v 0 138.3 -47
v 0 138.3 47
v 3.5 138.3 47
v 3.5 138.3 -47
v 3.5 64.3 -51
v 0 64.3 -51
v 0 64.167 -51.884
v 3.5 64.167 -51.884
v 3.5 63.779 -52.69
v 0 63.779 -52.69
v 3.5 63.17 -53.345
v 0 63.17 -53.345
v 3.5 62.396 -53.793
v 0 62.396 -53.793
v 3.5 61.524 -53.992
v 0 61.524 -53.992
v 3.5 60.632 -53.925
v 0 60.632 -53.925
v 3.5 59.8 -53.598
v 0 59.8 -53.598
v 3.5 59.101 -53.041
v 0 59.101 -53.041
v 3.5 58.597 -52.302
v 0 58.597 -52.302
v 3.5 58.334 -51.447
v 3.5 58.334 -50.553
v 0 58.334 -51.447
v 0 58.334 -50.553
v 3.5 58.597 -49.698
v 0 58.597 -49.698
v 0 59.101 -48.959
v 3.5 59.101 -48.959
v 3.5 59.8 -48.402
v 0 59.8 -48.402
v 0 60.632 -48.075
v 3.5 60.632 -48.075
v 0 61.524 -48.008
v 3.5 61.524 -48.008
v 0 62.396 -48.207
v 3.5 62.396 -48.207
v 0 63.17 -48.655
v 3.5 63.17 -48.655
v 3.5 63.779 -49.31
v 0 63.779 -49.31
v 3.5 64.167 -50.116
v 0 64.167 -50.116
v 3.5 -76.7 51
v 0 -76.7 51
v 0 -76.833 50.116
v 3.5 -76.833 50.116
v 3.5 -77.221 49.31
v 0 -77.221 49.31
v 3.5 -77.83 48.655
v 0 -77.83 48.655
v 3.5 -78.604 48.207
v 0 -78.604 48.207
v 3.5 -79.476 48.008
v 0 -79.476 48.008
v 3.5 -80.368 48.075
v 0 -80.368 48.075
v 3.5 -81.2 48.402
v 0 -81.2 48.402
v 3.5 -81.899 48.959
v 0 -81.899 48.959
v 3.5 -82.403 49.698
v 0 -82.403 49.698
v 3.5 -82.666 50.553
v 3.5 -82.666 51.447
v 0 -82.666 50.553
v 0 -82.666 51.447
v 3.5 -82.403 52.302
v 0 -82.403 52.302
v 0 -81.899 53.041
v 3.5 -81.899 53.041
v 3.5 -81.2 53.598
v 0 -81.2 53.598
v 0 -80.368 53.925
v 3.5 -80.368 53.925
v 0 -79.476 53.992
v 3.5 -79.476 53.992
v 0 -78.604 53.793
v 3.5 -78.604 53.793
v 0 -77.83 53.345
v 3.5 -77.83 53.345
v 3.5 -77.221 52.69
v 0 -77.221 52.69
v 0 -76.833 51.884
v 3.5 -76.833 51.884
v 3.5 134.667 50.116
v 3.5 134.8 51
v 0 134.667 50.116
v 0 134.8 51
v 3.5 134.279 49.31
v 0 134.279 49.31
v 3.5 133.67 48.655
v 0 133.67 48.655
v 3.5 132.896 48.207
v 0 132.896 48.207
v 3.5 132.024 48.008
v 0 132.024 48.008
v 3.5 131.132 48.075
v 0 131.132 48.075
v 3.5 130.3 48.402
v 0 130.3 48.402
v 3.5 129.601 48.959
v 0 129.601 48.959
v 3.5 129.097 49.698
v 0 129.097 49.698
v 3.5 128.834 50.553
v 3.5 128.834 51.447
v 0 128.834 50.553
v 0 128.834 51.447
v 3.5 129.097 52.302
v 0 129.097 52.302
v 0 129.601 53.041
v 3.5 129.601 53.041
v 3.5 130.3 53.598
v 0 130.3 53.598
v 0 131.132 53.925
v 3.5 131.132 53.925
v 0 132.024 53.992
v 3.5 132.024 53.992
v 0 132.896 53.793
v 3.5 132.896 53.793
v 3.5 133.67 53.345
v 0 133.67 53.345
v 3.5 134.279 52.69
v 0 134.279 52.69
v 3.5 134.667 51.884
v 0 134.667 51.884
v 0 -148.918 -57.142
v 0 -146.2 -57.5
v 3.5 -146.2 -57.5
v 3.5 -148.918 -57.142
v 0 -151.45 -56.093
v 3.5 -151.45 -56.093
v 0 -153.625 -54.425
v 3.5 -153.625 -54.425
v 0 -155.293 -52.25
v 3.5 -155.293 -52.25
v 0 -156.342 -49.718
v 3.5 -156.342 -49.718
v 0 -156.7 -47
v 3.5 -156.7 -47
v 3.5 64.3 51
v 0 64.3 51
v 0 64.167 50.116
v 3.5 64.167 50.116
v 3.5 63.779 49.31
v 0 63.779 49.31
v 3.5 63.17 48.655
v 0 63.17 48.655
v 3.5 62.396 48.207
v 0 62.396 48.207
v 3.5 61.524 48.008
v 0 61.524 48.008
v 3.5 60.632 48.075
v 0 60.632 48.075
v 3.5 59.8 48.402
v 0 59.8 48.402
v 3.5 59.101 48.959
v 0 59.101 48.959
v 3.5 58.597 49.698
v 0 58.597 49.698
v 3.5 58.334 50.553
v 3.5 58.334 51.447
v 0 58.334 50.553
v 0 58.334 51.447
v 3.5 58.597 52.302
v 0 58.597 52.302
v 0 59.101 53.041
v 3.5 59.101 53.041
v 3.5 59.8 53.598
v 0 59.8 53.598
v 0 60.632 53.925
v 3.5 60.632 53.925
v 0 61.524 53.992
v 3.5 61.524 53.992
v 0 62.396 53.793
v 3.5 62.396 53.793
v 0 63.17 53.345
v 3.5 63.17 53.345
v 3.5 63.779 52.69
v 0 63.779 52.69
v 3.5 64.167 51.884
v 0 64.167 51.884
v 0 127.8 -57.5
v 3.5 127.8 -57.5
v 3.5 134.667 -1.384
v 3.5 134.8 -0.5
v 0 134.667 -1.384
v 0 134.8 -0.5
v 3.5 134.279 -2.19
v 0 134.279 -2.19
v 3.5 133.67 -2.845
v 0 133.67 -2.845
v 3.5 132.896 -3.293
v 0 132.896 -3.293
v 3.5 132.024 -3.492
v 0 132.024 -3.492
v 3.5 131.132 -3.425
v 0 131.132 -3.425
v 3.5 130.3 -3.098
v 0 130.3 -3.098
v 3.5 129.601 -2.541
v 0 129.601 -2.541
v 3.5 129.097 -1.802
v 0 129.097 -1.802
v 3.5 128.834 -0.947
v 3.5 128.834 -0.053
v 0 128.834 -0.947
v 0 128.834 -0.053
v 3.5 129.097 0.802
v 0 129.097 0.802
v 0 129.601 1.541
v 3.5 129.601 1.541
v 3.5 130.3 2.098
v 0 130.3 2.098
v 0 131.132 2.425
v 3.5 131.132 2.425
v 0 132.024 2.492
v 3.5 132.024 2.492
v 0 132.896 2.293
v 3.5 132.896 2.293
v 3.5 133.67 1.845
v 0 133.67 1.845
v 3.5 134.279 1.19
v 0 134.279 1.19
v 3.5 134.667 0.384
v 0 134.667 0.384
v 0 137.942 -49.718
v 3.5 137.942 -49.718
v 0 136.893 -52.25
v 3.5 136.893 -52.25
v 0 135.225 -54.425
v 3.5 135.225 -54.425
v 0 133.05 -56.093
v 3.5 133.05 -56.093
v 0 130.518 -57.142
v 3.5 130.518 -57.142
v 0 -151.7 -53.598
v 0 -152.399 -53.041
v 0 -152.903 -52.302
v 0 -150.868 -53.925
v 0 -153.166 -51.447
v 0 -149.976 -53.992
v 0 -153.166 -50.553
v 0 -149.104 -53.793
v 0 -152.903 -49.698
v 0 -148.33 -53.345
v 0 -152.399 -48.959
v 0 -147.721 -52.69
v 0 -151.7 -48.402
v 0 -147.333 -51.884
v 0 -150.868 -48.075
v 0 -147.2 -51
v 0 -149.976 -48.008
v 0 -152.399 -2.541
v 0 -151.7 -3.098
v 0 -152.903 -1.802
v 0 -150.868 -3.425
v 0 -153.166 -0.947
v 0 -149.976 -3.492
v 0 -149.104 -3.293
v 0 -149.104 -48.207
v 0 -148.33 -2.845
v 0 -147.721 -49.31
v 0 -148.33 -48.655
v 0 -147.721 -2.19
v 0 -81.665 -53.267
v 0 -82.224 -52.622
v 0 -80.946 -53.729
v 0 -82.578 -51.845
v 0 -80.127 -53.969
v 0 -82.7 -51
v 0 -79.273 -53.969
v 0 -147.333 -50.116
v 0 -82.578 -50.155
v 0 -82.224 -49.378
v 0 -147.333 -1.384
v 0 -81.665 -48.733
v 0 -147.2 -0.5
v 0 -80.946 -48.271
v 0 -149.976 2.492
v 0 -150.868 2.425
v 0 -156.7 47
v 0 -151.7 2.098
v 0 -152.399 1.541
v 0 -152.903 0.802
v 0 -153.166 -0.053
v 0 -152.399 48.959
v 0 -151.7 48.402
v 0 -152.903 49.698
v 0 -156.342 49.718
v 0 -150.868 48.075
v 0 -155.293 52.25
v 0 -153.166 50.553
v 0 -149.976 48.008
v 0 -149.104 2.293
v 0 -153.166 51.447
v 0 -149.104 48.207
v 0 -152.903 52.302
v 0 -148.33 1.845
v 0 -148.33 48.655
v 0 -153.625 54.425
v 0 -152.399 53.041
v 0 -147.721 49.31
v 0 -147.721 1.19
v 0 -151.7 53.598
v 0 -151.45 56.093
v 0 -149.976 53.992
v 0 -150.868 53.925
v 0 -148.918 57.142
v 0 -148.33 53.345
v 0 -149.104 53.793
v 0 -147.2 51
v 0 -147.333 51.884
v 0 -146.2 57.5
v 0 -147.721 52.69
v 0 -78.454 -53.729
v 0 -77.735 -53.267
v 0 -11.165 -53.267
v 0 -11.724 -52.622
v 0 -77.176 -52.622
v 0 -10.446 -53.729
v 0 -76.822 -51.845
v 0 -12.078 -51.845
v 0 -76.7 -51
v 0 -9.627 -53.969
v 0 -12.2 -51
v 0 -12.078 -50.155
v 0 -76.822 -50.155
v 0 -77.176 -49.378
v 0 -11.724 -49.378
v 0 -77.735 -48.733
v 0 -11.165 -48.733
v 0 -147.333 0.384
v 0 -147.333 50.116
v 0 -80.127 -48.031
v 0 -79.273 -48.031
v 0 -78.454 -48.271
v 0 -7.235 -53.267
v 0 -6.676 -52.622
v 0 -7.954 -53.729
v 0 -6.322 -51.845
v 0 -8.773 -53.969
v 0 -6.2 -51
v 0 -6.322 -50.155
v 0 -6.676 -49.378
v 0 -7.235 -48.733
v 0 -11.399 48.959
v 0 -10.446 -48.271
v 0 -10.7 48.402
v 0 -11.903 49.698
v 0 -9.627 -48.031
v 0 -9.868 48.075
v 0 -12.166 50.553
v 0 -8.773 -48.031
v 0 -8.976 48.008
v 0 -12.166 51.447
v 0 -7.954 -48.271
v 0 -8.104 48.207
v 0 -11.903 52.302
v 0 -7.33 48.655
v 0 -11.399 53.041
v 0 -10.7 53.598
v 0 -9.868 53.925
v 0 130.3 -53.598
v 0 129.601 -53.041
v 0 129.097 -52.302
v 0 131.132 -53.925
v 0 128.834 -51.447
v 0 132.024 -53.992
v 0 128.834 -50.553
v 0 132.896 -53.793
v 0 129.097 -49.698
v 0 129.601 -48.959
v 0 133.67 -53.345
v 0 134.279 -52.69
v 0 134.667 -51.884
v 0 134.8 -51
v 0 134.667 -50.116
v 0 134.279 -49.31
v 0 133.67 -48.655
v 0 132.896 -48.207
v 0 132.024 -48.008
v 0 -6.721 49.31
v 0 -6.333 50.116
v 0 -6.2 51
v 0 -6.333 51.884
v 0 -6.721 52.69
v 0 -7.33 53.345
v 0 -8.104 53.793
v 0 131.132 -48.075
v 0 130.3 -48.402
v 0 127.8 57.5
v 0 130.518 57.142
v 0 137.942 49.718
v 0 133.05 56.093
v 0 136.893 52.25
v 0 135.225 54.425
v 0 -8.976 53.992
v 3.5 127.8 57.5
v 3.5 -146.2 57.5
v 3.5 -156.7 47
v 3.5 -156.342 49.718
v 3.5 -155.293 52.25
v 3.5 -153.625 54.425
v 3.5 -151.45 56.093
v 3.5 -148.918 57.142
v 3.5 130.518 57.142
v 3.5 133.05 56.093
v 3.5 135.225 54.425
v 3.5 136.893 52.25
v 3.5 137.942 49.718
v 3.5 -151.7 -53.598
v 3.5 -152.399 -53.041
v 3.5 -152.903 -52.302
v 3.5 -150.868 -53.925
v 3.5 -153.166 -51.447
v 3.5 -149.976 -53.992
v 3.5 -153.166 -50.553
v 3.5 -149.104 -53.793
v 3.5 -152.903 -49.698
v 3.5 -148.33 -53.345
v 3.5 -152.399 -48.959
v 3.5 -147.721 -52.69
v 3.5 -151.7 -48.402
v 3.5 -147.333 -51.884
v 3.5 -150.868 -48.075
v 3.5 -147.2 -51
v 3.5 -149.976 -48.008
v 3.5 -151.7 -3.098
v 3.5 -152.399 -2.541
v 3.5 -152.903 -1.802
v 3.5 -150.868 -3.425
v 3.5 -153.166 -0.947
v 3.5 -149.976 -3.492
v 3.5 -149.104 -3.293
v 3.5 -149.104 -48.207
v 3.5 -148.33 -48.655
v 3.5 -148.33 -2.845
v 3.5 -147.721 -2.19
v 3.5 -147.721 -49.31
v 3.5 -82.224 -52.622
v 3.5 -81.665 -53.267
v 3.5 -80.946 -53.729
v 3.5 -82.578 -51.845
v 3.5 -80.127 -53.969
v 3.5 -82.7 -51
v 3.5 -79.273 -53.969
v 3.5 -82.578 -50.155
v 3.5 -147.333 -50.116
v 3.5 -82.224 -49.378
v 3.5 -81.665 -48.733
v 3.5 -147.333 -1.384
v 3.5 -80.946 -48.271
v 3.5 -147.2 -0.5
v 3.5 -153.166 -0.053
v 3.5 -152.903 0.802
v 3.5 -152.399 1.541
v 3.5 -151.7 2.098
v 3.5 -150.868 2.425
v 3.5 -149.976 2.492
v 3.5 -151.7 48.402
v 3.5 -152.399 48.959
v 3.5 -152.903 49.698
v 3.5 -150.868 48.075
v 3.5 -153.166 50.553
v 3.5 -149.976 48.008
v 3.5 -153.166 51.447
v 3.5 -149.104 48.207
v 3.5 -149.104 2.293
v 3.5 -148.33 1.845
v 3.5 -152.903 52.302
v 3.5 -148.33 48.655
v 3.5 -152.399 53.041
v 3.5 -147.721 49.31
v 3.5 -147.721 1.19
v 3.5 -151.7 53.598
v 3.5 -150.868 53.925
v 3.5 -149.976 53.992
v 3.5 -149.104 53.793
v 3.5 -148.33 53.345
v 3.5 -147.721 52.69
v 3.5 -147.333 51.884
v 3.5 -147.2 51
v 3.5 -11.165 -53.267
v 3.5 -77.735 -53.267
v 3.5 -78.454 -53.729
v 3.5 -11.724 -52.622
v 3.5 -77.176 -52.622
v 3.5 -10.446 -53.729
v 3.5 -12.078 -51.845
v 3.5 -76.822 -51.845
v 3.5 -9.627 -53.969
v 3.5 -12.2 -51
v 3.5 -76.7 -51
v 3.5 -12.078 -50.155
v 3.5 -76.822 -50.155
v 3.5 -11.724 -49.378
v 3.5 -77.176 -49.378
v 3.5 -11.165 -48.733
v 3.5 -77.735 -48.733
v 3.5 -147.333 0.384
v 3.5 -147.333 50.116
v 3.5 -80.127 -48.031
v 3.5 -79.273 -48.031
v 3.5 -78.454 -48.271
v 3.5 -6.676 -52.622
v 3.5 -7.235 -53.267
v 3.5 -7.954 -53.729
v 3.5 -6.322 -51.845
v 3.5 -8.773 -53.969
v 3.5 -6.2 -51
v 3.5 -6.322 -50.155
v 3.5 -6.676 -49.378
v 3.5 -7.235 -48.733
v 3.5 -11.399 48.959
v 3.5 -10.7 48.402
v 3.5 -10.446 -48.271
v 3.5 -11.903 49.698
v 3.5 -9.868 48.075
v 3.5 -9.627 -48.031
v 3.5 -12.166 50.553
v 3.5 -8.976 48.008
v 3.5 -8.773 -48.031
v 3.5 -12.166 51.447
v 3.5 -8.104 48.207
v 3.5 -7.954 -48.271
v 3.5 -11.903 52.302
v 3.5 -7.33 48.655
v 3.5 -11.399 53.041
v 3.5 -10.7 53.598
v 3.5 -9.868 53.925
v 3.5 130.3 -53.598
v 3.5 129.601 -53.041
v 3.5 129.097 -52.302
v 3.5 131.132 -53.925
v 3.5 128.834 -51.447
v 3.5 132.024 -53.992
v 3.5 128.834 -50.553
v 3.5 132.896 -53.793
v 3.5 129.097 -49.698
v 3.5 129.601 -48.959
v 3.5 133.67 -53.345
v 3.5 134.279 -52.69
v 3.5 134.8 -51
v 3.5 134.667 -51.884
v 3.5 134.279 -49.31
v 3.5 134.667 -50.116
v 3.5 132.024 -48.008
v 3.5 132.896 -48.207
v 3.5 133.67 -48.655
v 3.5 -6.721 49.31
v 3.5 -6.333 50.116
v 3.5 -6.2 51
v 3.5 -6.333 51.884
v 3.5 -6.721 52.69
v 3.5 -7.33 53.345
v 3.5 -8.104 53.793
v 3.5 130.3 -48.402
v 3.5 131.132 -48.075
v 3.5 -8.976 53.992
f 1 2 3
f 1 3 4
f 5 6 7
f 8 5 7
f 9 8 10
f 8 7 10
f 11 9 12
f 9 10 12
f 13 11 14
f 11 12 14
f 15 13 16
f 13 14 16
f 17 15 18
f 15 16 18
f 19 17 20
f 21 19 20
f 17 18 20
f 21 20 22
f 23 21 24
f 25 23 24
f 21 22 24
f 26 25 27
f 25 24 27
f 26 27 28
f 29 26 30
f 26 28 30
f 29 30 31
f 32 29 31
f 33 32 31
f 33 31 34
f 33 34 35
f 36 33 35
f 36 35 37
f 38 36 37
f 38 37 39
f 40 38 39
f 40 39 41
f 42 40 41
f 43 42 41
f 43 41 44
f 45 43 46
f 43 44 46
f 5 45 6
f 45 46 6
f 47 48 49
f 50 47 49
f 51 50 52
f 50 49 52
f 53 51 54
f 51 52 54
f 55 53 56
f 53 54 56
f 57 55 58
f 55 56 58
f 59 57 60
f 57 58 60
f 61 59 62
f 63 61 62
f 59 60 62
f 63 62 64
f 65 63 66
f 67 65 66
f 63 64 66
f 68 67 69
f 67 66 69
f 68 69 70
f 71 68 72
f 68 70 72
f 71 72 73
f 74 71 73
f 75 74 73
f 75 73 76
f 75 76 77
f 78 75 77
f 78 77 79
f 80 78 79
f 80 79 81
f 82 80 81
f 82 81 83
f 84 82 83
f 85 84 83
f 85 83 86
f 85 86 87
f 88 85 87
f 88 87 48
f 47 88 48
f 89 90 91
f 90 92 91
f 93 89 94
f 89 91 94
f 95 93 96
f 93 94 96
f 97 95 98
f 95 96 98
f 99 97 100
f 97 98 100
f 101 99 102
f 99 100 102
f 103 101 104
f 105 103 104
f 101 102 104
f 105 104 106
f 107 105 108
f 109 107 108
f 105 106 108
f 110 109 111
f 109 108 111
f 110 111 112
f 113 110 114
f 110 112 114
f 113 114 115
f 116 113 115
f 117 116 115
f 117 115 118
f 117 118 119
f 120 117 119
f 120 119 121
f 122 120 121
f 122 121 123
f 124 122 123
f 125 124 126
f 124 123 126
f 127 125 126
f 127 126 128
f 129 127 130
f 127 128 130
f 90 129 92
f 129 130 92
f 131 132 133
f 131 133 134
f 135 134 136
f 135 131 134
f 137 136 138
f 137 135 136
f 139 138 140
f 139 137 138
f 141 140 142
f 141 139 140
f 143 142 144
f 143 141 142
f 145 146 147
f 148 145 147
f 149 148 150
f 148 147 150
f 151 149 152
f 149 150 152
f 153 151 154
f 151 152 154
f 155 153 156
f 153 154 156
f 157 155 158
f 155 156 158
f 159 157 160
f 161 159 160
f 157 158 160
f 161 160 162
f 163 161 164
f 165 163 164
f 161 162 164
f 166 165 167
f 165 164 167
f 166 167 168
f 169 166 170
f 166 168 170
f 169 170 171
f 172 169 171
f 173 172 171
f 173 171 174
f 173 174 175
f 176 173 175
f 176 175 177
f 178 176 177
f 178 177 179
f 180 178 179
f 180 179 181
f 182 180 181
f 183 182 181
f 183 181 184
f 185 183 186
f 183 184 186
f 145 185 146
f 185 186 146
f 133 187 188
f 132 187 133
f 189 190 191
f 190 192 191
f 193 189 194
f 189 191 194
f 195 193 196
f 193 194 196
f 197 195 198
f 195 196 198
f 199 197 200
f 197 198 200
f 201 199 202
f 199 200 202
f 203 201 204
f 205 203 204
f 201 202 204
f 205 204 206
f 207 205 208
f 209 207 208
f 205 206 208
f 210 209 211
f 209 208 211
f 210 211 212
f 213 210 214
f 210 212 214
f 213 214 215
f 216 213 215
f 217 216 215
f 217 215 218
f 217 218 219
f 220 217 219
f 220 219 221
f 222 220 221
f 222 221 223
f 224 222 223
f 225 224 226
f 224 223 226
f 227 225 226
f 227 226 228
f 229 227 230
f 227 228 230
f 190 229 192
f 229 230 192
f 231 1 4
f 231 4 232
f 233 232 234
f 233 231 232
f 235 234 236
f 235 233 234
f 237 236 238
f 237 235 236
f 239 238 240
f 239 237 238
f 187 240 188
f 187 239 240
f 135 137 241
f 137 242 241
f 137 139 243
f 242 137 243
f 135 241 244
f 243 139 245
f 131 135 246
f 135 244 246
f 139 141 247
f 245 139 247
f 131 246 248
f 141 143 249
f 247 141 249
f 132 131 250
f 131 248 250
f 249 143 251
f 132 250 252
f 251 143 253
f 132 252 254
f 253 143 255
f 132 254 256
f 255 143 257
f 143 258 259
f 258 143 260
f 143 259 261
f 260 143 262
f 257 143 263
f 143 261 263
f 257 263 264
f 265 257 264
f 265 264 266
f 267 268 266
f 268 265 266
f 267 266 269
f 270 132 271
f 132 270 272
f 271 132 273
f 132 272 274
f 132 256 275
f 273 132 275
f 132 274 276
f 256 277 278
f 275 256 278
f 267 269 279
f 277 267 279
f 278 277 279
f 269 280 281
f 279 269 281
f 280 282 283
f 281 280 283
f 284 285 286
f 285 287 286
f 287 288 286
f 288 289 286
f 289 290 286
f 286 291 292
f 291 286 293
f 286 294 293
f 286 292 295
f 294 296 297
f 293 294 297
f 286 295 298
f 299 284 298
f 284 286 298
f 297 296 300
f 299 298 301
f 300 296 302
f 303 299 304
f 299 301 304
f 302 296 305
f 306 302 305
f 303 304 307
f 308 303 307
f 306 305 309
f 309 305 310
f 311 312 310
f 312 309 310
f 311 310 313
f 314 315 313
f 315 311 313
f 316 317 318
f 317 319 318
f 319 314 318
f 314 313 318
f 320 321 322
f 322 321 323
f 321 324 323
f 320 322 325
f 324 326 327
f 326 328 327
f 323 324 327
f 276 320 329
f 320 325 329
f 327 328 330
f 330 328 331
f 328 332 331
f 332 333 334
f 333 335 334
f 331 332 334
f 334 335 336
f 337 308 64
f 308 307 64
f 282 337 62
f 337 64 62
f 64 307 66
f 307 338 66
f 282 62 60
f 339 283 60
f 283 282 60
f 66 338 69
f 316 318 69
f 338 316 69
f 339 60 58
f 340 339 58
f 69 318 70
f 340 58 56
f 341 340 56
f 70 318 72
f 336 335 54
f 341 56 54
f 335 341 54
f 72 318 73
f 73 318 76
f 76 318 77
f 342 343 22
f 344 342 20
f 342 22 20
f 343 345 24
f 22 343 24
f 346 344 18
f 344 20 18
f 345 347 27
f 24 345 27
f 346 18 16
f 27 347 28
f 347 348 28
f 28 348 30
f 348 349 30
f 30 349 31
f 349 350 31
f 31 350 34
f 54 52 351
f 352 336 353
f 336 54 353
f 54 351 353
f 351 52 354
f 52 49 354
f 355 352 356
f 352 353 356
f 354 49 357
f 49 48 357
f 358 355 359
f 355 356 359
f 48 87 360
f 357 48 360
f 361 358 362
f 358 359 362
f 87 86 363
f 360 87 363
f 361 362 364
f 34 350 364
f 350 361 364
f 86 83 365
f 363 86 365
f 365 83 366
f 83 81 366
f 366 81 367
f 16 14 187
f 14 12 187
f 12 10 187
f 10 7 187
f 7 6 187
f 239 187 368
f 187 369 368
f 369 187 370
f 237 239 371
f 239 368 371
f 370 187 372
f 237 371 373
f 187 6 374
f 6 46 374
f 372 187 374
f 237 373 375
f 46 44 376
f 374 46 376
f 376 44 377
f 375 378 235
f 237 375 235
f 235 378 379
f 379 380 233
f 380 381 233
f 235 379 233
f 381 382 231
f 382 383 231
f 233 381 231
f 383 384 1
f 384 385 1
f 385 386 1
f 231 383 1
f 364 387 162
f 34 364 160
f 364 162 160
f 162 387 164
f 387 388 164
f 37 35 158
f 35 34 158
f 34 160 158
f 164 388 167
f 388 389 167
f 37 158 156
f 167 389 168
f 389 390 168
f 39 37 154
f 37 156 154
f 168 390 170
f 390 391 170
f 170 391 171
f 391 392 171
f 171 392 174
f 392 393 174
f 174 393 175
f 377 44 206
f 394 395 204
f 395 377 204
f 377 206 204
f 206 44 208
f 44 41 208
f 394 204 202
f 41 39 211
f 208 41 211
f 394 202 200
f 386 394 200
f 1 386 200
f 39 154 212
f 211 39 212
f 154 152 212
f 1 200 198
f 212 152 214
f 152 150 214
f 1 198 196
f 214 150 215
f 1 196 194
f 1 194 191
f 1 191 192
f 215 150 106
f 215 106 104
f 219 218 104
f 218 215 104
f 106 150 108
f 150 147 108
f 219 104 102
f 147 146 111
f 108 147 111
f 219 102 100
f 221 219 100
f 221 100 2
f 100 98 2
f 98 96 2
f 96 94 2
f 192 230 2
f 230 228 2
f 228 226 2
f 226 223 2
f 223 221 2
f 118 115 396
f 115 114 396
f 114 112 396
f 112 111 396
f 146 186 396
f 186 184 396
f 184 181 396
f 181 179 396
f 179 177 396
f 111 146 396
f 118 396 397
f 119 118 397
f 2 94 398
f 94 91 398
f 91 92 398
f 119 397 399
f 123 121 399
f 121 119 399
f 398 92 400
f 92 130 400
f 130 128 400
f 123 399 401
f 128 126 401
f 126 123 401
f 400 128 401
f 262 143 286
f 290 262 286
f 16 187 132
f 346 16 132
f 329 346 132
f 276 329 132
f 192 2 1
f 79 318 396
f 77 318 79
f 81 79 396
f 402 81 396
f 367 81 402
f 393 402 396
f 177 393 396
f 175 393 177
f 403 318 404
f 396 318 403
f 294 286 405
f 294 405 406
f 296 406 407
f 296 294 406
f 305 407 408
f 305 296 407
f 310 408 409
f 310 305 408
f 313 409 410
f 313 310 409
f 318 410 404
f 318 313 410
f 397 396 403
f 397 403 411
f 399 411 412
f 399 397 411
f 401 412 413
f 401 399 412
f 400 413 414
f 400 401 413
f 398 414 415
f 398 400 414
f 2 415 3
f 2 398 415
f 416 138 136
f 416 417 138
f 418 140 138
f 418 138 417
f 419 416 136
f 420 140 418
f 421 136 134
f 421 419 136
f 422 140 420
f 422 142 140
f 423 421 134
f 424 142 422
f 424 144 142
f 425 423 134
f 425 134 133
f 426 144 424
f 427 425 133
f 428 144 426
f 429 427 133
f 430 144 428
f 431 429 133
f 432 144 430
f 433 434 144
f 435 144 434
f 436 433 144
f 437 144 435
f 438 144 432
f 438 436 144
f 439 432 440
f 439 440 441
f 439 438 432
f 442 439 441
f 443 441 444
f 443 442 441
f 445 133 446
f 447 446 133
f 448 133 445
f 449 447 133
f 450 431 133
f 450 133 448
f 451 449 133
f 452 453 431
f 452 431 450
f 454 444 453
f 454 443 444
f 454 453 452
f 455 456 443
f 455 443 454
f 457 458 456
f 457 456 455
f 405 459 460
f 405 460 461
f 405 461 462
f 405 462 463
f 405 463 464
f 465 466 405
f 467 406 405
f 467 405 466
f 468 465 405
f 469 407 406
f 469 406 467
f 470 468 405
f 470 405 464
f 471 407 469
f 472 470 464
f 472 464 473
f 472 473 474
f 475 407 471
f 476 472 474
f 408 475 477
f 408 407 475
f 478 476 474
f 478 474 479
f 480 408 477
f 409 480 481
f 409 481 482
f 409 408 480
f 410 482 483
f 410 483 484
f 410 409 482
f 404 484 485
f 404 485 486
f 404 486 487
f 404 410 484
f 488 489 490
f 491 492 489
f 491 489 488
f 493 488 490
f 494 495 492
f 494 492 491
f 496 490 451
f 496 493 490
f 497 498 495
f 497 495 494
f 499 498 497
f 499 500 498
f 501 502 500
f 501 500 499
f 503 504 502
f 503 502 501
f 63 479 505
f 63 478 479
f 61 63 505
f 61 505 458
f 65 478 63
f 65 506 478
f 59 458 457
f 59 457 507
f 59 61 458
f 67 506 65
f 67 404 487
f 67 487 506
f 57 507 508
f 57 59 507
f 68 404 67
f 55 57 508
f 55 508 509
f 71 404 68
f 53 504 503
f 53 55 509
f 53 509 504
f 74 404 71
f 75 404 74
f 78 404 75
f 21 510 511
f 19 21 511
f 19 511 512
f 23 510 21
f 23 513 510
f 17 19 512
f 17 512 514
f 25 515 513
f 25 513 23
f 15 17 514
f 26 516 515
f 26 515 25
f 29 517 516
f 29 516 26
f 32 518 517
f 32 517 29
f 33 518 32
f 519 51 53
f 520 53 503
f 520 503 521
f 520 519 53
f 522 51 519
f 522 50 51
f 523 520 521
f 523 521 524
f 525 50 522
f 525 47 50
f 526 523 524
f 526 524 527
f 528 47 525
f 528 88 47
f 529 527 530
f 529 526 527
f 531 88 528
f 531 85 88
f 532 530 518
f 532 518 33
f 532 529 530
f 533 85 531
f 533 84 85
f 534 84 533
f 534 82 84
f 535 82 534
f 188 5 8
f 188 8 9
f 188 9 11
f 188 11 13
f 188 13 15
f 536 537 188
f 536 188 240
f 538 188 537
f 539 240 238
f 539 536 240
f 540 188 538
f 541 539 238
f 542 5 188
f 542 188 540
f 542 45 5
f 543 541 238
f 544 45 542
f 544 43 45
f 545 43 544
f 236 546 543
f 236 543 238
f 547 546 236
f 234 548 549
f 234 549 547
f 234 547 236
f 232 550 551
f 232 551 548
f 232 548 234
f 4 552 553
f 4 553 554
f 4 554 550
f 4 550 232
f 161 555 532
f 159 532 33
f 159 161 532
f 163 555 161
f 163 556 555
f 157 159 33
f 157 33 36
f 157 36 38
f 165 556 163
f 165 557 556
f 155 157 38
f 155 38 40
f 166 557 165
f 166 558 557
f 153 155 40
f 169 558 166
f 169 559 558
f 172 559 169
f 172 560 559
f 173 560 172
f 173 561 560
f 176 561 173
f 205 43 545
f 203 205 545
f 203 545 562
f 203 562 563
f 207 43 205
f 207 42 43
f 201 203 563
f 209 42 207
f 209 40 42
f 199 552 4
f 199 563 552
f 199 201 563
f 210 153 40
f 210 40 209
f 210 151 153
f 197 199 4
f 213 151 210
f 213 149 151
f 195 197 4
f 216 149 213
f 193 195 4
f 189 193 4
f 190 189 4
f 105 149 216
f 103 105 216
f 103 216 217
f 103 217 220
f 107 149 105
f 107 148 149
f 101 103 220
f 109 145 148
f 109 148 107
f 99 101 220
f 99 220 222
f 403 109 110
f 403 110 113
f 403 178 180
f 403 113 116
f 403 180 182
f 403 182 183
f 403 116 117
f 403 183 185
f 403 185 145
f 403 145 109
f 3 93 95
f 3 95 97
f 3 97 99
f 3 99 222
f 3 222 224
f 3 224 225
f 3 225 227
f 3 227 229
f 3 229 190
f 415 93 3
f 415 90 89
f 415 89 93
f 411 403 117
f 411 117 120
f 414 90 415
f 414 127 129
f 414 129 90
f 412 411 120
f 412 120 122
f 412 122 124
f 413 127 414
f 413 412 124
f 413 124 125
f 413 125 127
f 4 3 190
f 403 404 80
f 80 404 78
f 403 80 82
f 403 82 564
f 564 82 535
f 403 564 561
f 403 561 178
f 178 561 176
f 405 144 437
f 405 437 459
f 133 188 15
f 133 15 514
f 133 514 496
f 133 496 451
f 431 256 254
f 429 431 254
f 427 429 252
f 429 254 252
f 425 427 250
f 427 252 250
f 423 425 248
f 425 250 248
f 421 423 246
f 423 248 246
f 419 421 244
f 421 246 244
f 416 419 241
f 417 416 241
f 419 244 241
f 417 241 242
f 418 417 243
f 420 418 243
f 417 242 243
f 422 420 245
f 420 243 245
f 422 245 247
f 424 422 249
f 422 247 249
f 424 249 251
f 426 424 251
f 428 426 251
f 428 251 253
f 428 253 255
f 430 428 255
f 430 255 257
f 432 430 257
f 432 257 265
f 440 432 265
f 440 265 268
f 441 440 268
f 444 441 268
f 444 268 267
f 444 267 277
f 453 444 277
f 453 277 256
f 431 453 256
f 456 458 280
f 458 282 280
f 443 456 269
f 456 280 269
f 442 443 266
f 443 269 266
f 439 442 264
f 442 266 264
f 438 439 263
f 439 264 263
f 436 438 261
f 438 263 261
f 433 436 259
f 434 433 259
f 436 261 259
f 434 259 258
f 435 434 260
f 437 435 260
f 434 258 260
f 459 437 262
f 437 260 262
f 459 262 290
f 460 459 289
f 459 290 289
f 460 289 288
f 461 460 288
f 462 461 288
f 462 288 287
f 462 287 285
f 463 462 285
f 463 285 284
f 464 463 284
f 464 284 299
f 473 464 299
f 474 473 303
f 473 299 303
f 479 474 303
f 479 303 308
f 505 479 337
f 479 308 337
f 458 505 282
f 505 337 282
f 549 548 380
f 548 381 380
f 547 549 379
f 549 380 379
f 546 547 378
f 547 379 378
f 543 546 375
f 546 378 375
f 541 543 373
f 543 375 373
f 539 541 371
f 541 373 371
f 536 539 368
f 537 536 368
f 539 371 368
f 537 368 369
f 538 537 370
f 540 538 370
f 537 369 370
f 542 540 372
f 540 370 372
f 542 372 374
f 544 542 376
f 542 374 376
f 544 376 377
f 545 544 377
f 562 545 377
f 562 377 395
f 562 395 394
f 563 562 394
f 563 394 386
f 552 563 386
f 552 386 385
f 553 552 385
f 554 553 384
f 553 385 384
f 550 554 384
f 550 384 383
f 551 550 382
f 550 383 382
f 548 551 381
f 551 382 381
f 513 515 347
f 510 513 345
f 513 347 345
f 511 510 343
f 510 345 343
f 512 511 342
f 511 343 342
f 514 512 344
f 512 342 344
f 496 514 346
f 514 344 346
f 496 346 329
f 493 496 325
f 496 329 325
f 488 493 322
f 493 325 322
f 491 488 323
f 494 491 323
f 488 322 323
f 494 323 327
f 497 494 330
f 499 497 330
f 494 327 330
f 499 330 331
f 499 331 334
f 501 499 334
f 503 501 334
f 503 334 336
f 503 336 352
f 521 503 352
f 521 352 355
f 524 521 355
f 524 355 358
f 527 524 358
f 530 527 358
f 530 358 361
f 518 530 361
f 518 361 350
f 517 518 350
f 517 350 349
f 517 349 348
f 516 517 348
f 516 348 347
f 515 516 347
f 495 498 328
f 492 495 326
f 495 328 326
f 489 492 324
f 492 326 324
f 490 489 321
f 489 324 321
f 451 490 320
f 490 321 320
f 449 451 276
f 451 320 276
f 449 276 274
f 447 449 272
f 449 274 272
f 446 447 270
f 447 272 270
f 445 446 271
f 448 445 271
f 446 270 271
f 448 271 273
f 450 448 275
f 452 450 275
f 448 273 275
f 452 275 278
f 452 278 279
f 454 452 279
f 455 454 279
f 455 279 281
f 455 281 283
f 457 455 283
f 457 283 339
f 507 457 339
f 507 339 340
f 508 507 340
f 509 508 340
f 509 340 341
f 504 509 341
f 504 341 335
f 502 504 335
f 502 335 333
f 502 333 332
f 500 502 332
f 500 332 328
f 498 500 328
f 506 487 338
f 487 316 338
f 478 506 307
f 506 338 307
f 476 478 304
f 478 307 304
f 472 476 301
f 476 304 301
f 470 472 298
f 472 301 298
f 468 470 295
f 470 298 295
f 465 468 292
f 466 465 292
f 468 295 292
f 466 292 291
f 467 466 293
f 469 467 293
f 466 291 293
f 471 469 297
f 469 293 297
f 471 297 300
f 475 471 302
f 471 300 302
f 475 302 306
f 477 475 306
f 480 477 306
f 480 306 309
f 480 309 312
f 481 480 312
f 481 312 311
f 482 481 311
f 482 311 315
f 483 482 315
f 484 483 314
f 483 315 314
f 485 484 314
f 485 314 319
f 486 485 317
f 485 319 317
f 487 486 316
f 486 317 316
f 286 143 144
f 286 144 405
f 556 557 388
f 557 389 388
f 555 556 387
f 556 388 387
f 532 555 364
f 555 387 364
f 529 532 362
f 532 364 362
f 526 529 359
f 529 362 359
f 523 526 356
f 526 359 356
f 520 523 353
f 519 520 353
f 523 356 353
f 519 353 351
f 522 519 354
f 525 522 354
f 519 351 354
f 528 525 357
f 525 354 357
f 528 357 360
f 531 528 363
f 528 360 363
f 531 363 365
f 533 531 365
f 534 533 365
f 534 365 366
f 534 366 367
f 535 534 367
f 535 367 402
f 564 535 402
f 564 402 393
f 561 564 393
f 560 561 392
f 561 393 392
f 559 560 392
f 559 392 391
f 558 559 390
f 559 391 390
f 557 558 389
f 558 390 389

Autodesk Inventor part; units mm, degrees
sketch "Эскиз1" plane through (0, 0, 0) normal (1, 0, 0) x (0, 1, 0)
  line L0 (-146.2, 57.5) -> (127.8, 57.5)
  line L1 (138.3, 47) -> (138.3, -47)
  line L2 (127.8, -57.5) -> (-146.2, -57.5)
  line L3 (-156.7, -47) -> (-156.7, 47)
  line L4 (-227.1367, 0) -> (250.6977, 0) projected
  arc A0 (-146.2, 57.5) -> (-156.7, 47) centre (-146.2, 47) ccw
  arc A1 (-156.7, -47) -> (-146.2, -57.5) centre (-146.2, -47) ccw
  arc A2 (127.8, -57.5) -> (138.3, -47) centre (127.8, -47) ccw
  arc A3 (138.3, 47) -> (127.8, 57.5) centre (127.8, 47) ccw
  line L5 (-66.5644, 51) -> (182.4356, 51)
  line L6 (131.8, 34) -> (131.8, -35)
  line L7 (182.4356, -51) -> (-66.5644, -51)
  line L8 (-150.2, -35) -> (-150.2, 34)
  circle A4 centre (-79.7, 51) radius 3
  circle A5 centre (-9.2, 51) radius 3
  circle A6 centre (61.3, 51) radius 3
  circle A7 centre (-79.7, -51) radius 3
  circle A8 centre (-9.2, -51) radius 3
  circle A9 centre (61.3, -51) radius 3
  circle A10 centre (131.8, -0.5) radius 3
  circle A11 centre (-150.2, -0.5) radius 3
  line L9 (-150.2, 34) -> (-150.2, 51)
  line L10 (-150.2, 51) -> (-66.5644, 51)
  line L11 (182.4356, 51) -> (131.8, 51)
  line L12 (131.8, 51) -> (131.8, 34)
  line L13 (131.8, -35) -> (131.8, -51)
  line L14 (131.8, -51) -> (181.2224, -51)
  line L15 (-66.5644, -51) -> (-150.2, -51)
  line L16 (-150.2, -36.3739) -> (-150.2, -51)
  circle A12 centre (-150.2, 51) radius 3
  circle A13 centre (-150.2, -51) radius 3
  circle A14 centre (131.8, -51) radius 3
  circle A15 centre (131.8, 51) radius 3
  line L17 (0, -83.5445) -> (0, 83.5445) projected
  point P0 (0, 0)
  dimension "d0" = 115
  dimension "d1" = 295
  dimension "d2" = 10.5
  dimension "d3" = 10.5
  dimension "d7" = 6.5
  dimension "d8" = 6.5
  dimension "d9" = 6.5
  dimension "d10" = 6.5
  dimension "d15" = 6
  dimension "d16" = 6
  dimension "d17" = 6
  dimension "d19" = 6
  dimension "d20" = 6
  dimension "d21" = 6
  dimension "d23" = 6
  dimension "d24" = 6
  dimension "d25" = 70.5
  dimension "d26" = 70.5
  dimension "d27" = 70.5
  dimension "d28" = 6
  dimension "d29" = 6
  dimension "d30" = 6
  dimension "d31" = 6
  dimension "d34" = 70.5
  dimension "d35" = 70.5
  dimension "d36" = 70.5
  dimension "d37" = 138.3
extrude "Выдавливание1" add sketch "Эскиз1" along normal blind 3.5 contours L0 L17 L5 A5 L10 A4 A12 L9 L8 A11 L4 L3 A0 | L0 A3 L5 A15 A6 L17 | L17 L4 A11 L8 L9 A12 L10 A4 L5 A5 | L5 A6 A15 L12 L6 A10 L4 L17 | A13 L16 L15 | L15 L16 A13 | A7 L15 | L15 A7 | A8 L7 | L7 A8 | L4 A11 L17 L2 A1 L3 | A3 L1 L4 A10 L6 L12 A15 L5 | A5 L5 | L5 A5 | A6 L5 | L5 A6 | L4 A10 L6 L13 A14 L7 A9 L17 | A11 L8 L4 | L4 L8 A11 | A15 L12 L5 | L5 A15 | A11 L8 L4 | L4 L8 A11 | A10 L6 L4 | L4 L6 A10 | L7 A9 A14 A2 L2 L17 | L1 A2 L7 A14 L13 L6 A10 L4 | L12 A15 L5 | L6 A10 L4 | L4 A10 L6 | A9 L7 | L7 A9 | L10 A4 | A4 L10 | A12 L10 L9 | L9 L10 A12 | A14 L7 L13 | L13 L7 A14 | L7 A14
extrude "Выдавливание2" cut sketch "Эскиз1" along normal blind 5 contours A13 L16 L15 | L15 L16 A13 | A7 L15 | L15 A7 | A8 L7 | L7 A8 | A5 L5 | L5 A5 | A6 L5 | L5 A6 | A11 L8 L4 | L4 L8 A11 | A15 L12 L5 | L5 A15 | A11 L8 L4 | L4 L8 A11 | A10 L6 L4 | L4 L6 A10 | L12 A15 L5 | L6 A10 L4 | L4 A10 L6 | A9 L7 | L7 A9 | L10 A4 | A4 L10 | A12 L10 L9 | L9 L10 A12 | A14 L7 L13 | L13 L7 A14 | L7 A14
properties part number "крыша"
